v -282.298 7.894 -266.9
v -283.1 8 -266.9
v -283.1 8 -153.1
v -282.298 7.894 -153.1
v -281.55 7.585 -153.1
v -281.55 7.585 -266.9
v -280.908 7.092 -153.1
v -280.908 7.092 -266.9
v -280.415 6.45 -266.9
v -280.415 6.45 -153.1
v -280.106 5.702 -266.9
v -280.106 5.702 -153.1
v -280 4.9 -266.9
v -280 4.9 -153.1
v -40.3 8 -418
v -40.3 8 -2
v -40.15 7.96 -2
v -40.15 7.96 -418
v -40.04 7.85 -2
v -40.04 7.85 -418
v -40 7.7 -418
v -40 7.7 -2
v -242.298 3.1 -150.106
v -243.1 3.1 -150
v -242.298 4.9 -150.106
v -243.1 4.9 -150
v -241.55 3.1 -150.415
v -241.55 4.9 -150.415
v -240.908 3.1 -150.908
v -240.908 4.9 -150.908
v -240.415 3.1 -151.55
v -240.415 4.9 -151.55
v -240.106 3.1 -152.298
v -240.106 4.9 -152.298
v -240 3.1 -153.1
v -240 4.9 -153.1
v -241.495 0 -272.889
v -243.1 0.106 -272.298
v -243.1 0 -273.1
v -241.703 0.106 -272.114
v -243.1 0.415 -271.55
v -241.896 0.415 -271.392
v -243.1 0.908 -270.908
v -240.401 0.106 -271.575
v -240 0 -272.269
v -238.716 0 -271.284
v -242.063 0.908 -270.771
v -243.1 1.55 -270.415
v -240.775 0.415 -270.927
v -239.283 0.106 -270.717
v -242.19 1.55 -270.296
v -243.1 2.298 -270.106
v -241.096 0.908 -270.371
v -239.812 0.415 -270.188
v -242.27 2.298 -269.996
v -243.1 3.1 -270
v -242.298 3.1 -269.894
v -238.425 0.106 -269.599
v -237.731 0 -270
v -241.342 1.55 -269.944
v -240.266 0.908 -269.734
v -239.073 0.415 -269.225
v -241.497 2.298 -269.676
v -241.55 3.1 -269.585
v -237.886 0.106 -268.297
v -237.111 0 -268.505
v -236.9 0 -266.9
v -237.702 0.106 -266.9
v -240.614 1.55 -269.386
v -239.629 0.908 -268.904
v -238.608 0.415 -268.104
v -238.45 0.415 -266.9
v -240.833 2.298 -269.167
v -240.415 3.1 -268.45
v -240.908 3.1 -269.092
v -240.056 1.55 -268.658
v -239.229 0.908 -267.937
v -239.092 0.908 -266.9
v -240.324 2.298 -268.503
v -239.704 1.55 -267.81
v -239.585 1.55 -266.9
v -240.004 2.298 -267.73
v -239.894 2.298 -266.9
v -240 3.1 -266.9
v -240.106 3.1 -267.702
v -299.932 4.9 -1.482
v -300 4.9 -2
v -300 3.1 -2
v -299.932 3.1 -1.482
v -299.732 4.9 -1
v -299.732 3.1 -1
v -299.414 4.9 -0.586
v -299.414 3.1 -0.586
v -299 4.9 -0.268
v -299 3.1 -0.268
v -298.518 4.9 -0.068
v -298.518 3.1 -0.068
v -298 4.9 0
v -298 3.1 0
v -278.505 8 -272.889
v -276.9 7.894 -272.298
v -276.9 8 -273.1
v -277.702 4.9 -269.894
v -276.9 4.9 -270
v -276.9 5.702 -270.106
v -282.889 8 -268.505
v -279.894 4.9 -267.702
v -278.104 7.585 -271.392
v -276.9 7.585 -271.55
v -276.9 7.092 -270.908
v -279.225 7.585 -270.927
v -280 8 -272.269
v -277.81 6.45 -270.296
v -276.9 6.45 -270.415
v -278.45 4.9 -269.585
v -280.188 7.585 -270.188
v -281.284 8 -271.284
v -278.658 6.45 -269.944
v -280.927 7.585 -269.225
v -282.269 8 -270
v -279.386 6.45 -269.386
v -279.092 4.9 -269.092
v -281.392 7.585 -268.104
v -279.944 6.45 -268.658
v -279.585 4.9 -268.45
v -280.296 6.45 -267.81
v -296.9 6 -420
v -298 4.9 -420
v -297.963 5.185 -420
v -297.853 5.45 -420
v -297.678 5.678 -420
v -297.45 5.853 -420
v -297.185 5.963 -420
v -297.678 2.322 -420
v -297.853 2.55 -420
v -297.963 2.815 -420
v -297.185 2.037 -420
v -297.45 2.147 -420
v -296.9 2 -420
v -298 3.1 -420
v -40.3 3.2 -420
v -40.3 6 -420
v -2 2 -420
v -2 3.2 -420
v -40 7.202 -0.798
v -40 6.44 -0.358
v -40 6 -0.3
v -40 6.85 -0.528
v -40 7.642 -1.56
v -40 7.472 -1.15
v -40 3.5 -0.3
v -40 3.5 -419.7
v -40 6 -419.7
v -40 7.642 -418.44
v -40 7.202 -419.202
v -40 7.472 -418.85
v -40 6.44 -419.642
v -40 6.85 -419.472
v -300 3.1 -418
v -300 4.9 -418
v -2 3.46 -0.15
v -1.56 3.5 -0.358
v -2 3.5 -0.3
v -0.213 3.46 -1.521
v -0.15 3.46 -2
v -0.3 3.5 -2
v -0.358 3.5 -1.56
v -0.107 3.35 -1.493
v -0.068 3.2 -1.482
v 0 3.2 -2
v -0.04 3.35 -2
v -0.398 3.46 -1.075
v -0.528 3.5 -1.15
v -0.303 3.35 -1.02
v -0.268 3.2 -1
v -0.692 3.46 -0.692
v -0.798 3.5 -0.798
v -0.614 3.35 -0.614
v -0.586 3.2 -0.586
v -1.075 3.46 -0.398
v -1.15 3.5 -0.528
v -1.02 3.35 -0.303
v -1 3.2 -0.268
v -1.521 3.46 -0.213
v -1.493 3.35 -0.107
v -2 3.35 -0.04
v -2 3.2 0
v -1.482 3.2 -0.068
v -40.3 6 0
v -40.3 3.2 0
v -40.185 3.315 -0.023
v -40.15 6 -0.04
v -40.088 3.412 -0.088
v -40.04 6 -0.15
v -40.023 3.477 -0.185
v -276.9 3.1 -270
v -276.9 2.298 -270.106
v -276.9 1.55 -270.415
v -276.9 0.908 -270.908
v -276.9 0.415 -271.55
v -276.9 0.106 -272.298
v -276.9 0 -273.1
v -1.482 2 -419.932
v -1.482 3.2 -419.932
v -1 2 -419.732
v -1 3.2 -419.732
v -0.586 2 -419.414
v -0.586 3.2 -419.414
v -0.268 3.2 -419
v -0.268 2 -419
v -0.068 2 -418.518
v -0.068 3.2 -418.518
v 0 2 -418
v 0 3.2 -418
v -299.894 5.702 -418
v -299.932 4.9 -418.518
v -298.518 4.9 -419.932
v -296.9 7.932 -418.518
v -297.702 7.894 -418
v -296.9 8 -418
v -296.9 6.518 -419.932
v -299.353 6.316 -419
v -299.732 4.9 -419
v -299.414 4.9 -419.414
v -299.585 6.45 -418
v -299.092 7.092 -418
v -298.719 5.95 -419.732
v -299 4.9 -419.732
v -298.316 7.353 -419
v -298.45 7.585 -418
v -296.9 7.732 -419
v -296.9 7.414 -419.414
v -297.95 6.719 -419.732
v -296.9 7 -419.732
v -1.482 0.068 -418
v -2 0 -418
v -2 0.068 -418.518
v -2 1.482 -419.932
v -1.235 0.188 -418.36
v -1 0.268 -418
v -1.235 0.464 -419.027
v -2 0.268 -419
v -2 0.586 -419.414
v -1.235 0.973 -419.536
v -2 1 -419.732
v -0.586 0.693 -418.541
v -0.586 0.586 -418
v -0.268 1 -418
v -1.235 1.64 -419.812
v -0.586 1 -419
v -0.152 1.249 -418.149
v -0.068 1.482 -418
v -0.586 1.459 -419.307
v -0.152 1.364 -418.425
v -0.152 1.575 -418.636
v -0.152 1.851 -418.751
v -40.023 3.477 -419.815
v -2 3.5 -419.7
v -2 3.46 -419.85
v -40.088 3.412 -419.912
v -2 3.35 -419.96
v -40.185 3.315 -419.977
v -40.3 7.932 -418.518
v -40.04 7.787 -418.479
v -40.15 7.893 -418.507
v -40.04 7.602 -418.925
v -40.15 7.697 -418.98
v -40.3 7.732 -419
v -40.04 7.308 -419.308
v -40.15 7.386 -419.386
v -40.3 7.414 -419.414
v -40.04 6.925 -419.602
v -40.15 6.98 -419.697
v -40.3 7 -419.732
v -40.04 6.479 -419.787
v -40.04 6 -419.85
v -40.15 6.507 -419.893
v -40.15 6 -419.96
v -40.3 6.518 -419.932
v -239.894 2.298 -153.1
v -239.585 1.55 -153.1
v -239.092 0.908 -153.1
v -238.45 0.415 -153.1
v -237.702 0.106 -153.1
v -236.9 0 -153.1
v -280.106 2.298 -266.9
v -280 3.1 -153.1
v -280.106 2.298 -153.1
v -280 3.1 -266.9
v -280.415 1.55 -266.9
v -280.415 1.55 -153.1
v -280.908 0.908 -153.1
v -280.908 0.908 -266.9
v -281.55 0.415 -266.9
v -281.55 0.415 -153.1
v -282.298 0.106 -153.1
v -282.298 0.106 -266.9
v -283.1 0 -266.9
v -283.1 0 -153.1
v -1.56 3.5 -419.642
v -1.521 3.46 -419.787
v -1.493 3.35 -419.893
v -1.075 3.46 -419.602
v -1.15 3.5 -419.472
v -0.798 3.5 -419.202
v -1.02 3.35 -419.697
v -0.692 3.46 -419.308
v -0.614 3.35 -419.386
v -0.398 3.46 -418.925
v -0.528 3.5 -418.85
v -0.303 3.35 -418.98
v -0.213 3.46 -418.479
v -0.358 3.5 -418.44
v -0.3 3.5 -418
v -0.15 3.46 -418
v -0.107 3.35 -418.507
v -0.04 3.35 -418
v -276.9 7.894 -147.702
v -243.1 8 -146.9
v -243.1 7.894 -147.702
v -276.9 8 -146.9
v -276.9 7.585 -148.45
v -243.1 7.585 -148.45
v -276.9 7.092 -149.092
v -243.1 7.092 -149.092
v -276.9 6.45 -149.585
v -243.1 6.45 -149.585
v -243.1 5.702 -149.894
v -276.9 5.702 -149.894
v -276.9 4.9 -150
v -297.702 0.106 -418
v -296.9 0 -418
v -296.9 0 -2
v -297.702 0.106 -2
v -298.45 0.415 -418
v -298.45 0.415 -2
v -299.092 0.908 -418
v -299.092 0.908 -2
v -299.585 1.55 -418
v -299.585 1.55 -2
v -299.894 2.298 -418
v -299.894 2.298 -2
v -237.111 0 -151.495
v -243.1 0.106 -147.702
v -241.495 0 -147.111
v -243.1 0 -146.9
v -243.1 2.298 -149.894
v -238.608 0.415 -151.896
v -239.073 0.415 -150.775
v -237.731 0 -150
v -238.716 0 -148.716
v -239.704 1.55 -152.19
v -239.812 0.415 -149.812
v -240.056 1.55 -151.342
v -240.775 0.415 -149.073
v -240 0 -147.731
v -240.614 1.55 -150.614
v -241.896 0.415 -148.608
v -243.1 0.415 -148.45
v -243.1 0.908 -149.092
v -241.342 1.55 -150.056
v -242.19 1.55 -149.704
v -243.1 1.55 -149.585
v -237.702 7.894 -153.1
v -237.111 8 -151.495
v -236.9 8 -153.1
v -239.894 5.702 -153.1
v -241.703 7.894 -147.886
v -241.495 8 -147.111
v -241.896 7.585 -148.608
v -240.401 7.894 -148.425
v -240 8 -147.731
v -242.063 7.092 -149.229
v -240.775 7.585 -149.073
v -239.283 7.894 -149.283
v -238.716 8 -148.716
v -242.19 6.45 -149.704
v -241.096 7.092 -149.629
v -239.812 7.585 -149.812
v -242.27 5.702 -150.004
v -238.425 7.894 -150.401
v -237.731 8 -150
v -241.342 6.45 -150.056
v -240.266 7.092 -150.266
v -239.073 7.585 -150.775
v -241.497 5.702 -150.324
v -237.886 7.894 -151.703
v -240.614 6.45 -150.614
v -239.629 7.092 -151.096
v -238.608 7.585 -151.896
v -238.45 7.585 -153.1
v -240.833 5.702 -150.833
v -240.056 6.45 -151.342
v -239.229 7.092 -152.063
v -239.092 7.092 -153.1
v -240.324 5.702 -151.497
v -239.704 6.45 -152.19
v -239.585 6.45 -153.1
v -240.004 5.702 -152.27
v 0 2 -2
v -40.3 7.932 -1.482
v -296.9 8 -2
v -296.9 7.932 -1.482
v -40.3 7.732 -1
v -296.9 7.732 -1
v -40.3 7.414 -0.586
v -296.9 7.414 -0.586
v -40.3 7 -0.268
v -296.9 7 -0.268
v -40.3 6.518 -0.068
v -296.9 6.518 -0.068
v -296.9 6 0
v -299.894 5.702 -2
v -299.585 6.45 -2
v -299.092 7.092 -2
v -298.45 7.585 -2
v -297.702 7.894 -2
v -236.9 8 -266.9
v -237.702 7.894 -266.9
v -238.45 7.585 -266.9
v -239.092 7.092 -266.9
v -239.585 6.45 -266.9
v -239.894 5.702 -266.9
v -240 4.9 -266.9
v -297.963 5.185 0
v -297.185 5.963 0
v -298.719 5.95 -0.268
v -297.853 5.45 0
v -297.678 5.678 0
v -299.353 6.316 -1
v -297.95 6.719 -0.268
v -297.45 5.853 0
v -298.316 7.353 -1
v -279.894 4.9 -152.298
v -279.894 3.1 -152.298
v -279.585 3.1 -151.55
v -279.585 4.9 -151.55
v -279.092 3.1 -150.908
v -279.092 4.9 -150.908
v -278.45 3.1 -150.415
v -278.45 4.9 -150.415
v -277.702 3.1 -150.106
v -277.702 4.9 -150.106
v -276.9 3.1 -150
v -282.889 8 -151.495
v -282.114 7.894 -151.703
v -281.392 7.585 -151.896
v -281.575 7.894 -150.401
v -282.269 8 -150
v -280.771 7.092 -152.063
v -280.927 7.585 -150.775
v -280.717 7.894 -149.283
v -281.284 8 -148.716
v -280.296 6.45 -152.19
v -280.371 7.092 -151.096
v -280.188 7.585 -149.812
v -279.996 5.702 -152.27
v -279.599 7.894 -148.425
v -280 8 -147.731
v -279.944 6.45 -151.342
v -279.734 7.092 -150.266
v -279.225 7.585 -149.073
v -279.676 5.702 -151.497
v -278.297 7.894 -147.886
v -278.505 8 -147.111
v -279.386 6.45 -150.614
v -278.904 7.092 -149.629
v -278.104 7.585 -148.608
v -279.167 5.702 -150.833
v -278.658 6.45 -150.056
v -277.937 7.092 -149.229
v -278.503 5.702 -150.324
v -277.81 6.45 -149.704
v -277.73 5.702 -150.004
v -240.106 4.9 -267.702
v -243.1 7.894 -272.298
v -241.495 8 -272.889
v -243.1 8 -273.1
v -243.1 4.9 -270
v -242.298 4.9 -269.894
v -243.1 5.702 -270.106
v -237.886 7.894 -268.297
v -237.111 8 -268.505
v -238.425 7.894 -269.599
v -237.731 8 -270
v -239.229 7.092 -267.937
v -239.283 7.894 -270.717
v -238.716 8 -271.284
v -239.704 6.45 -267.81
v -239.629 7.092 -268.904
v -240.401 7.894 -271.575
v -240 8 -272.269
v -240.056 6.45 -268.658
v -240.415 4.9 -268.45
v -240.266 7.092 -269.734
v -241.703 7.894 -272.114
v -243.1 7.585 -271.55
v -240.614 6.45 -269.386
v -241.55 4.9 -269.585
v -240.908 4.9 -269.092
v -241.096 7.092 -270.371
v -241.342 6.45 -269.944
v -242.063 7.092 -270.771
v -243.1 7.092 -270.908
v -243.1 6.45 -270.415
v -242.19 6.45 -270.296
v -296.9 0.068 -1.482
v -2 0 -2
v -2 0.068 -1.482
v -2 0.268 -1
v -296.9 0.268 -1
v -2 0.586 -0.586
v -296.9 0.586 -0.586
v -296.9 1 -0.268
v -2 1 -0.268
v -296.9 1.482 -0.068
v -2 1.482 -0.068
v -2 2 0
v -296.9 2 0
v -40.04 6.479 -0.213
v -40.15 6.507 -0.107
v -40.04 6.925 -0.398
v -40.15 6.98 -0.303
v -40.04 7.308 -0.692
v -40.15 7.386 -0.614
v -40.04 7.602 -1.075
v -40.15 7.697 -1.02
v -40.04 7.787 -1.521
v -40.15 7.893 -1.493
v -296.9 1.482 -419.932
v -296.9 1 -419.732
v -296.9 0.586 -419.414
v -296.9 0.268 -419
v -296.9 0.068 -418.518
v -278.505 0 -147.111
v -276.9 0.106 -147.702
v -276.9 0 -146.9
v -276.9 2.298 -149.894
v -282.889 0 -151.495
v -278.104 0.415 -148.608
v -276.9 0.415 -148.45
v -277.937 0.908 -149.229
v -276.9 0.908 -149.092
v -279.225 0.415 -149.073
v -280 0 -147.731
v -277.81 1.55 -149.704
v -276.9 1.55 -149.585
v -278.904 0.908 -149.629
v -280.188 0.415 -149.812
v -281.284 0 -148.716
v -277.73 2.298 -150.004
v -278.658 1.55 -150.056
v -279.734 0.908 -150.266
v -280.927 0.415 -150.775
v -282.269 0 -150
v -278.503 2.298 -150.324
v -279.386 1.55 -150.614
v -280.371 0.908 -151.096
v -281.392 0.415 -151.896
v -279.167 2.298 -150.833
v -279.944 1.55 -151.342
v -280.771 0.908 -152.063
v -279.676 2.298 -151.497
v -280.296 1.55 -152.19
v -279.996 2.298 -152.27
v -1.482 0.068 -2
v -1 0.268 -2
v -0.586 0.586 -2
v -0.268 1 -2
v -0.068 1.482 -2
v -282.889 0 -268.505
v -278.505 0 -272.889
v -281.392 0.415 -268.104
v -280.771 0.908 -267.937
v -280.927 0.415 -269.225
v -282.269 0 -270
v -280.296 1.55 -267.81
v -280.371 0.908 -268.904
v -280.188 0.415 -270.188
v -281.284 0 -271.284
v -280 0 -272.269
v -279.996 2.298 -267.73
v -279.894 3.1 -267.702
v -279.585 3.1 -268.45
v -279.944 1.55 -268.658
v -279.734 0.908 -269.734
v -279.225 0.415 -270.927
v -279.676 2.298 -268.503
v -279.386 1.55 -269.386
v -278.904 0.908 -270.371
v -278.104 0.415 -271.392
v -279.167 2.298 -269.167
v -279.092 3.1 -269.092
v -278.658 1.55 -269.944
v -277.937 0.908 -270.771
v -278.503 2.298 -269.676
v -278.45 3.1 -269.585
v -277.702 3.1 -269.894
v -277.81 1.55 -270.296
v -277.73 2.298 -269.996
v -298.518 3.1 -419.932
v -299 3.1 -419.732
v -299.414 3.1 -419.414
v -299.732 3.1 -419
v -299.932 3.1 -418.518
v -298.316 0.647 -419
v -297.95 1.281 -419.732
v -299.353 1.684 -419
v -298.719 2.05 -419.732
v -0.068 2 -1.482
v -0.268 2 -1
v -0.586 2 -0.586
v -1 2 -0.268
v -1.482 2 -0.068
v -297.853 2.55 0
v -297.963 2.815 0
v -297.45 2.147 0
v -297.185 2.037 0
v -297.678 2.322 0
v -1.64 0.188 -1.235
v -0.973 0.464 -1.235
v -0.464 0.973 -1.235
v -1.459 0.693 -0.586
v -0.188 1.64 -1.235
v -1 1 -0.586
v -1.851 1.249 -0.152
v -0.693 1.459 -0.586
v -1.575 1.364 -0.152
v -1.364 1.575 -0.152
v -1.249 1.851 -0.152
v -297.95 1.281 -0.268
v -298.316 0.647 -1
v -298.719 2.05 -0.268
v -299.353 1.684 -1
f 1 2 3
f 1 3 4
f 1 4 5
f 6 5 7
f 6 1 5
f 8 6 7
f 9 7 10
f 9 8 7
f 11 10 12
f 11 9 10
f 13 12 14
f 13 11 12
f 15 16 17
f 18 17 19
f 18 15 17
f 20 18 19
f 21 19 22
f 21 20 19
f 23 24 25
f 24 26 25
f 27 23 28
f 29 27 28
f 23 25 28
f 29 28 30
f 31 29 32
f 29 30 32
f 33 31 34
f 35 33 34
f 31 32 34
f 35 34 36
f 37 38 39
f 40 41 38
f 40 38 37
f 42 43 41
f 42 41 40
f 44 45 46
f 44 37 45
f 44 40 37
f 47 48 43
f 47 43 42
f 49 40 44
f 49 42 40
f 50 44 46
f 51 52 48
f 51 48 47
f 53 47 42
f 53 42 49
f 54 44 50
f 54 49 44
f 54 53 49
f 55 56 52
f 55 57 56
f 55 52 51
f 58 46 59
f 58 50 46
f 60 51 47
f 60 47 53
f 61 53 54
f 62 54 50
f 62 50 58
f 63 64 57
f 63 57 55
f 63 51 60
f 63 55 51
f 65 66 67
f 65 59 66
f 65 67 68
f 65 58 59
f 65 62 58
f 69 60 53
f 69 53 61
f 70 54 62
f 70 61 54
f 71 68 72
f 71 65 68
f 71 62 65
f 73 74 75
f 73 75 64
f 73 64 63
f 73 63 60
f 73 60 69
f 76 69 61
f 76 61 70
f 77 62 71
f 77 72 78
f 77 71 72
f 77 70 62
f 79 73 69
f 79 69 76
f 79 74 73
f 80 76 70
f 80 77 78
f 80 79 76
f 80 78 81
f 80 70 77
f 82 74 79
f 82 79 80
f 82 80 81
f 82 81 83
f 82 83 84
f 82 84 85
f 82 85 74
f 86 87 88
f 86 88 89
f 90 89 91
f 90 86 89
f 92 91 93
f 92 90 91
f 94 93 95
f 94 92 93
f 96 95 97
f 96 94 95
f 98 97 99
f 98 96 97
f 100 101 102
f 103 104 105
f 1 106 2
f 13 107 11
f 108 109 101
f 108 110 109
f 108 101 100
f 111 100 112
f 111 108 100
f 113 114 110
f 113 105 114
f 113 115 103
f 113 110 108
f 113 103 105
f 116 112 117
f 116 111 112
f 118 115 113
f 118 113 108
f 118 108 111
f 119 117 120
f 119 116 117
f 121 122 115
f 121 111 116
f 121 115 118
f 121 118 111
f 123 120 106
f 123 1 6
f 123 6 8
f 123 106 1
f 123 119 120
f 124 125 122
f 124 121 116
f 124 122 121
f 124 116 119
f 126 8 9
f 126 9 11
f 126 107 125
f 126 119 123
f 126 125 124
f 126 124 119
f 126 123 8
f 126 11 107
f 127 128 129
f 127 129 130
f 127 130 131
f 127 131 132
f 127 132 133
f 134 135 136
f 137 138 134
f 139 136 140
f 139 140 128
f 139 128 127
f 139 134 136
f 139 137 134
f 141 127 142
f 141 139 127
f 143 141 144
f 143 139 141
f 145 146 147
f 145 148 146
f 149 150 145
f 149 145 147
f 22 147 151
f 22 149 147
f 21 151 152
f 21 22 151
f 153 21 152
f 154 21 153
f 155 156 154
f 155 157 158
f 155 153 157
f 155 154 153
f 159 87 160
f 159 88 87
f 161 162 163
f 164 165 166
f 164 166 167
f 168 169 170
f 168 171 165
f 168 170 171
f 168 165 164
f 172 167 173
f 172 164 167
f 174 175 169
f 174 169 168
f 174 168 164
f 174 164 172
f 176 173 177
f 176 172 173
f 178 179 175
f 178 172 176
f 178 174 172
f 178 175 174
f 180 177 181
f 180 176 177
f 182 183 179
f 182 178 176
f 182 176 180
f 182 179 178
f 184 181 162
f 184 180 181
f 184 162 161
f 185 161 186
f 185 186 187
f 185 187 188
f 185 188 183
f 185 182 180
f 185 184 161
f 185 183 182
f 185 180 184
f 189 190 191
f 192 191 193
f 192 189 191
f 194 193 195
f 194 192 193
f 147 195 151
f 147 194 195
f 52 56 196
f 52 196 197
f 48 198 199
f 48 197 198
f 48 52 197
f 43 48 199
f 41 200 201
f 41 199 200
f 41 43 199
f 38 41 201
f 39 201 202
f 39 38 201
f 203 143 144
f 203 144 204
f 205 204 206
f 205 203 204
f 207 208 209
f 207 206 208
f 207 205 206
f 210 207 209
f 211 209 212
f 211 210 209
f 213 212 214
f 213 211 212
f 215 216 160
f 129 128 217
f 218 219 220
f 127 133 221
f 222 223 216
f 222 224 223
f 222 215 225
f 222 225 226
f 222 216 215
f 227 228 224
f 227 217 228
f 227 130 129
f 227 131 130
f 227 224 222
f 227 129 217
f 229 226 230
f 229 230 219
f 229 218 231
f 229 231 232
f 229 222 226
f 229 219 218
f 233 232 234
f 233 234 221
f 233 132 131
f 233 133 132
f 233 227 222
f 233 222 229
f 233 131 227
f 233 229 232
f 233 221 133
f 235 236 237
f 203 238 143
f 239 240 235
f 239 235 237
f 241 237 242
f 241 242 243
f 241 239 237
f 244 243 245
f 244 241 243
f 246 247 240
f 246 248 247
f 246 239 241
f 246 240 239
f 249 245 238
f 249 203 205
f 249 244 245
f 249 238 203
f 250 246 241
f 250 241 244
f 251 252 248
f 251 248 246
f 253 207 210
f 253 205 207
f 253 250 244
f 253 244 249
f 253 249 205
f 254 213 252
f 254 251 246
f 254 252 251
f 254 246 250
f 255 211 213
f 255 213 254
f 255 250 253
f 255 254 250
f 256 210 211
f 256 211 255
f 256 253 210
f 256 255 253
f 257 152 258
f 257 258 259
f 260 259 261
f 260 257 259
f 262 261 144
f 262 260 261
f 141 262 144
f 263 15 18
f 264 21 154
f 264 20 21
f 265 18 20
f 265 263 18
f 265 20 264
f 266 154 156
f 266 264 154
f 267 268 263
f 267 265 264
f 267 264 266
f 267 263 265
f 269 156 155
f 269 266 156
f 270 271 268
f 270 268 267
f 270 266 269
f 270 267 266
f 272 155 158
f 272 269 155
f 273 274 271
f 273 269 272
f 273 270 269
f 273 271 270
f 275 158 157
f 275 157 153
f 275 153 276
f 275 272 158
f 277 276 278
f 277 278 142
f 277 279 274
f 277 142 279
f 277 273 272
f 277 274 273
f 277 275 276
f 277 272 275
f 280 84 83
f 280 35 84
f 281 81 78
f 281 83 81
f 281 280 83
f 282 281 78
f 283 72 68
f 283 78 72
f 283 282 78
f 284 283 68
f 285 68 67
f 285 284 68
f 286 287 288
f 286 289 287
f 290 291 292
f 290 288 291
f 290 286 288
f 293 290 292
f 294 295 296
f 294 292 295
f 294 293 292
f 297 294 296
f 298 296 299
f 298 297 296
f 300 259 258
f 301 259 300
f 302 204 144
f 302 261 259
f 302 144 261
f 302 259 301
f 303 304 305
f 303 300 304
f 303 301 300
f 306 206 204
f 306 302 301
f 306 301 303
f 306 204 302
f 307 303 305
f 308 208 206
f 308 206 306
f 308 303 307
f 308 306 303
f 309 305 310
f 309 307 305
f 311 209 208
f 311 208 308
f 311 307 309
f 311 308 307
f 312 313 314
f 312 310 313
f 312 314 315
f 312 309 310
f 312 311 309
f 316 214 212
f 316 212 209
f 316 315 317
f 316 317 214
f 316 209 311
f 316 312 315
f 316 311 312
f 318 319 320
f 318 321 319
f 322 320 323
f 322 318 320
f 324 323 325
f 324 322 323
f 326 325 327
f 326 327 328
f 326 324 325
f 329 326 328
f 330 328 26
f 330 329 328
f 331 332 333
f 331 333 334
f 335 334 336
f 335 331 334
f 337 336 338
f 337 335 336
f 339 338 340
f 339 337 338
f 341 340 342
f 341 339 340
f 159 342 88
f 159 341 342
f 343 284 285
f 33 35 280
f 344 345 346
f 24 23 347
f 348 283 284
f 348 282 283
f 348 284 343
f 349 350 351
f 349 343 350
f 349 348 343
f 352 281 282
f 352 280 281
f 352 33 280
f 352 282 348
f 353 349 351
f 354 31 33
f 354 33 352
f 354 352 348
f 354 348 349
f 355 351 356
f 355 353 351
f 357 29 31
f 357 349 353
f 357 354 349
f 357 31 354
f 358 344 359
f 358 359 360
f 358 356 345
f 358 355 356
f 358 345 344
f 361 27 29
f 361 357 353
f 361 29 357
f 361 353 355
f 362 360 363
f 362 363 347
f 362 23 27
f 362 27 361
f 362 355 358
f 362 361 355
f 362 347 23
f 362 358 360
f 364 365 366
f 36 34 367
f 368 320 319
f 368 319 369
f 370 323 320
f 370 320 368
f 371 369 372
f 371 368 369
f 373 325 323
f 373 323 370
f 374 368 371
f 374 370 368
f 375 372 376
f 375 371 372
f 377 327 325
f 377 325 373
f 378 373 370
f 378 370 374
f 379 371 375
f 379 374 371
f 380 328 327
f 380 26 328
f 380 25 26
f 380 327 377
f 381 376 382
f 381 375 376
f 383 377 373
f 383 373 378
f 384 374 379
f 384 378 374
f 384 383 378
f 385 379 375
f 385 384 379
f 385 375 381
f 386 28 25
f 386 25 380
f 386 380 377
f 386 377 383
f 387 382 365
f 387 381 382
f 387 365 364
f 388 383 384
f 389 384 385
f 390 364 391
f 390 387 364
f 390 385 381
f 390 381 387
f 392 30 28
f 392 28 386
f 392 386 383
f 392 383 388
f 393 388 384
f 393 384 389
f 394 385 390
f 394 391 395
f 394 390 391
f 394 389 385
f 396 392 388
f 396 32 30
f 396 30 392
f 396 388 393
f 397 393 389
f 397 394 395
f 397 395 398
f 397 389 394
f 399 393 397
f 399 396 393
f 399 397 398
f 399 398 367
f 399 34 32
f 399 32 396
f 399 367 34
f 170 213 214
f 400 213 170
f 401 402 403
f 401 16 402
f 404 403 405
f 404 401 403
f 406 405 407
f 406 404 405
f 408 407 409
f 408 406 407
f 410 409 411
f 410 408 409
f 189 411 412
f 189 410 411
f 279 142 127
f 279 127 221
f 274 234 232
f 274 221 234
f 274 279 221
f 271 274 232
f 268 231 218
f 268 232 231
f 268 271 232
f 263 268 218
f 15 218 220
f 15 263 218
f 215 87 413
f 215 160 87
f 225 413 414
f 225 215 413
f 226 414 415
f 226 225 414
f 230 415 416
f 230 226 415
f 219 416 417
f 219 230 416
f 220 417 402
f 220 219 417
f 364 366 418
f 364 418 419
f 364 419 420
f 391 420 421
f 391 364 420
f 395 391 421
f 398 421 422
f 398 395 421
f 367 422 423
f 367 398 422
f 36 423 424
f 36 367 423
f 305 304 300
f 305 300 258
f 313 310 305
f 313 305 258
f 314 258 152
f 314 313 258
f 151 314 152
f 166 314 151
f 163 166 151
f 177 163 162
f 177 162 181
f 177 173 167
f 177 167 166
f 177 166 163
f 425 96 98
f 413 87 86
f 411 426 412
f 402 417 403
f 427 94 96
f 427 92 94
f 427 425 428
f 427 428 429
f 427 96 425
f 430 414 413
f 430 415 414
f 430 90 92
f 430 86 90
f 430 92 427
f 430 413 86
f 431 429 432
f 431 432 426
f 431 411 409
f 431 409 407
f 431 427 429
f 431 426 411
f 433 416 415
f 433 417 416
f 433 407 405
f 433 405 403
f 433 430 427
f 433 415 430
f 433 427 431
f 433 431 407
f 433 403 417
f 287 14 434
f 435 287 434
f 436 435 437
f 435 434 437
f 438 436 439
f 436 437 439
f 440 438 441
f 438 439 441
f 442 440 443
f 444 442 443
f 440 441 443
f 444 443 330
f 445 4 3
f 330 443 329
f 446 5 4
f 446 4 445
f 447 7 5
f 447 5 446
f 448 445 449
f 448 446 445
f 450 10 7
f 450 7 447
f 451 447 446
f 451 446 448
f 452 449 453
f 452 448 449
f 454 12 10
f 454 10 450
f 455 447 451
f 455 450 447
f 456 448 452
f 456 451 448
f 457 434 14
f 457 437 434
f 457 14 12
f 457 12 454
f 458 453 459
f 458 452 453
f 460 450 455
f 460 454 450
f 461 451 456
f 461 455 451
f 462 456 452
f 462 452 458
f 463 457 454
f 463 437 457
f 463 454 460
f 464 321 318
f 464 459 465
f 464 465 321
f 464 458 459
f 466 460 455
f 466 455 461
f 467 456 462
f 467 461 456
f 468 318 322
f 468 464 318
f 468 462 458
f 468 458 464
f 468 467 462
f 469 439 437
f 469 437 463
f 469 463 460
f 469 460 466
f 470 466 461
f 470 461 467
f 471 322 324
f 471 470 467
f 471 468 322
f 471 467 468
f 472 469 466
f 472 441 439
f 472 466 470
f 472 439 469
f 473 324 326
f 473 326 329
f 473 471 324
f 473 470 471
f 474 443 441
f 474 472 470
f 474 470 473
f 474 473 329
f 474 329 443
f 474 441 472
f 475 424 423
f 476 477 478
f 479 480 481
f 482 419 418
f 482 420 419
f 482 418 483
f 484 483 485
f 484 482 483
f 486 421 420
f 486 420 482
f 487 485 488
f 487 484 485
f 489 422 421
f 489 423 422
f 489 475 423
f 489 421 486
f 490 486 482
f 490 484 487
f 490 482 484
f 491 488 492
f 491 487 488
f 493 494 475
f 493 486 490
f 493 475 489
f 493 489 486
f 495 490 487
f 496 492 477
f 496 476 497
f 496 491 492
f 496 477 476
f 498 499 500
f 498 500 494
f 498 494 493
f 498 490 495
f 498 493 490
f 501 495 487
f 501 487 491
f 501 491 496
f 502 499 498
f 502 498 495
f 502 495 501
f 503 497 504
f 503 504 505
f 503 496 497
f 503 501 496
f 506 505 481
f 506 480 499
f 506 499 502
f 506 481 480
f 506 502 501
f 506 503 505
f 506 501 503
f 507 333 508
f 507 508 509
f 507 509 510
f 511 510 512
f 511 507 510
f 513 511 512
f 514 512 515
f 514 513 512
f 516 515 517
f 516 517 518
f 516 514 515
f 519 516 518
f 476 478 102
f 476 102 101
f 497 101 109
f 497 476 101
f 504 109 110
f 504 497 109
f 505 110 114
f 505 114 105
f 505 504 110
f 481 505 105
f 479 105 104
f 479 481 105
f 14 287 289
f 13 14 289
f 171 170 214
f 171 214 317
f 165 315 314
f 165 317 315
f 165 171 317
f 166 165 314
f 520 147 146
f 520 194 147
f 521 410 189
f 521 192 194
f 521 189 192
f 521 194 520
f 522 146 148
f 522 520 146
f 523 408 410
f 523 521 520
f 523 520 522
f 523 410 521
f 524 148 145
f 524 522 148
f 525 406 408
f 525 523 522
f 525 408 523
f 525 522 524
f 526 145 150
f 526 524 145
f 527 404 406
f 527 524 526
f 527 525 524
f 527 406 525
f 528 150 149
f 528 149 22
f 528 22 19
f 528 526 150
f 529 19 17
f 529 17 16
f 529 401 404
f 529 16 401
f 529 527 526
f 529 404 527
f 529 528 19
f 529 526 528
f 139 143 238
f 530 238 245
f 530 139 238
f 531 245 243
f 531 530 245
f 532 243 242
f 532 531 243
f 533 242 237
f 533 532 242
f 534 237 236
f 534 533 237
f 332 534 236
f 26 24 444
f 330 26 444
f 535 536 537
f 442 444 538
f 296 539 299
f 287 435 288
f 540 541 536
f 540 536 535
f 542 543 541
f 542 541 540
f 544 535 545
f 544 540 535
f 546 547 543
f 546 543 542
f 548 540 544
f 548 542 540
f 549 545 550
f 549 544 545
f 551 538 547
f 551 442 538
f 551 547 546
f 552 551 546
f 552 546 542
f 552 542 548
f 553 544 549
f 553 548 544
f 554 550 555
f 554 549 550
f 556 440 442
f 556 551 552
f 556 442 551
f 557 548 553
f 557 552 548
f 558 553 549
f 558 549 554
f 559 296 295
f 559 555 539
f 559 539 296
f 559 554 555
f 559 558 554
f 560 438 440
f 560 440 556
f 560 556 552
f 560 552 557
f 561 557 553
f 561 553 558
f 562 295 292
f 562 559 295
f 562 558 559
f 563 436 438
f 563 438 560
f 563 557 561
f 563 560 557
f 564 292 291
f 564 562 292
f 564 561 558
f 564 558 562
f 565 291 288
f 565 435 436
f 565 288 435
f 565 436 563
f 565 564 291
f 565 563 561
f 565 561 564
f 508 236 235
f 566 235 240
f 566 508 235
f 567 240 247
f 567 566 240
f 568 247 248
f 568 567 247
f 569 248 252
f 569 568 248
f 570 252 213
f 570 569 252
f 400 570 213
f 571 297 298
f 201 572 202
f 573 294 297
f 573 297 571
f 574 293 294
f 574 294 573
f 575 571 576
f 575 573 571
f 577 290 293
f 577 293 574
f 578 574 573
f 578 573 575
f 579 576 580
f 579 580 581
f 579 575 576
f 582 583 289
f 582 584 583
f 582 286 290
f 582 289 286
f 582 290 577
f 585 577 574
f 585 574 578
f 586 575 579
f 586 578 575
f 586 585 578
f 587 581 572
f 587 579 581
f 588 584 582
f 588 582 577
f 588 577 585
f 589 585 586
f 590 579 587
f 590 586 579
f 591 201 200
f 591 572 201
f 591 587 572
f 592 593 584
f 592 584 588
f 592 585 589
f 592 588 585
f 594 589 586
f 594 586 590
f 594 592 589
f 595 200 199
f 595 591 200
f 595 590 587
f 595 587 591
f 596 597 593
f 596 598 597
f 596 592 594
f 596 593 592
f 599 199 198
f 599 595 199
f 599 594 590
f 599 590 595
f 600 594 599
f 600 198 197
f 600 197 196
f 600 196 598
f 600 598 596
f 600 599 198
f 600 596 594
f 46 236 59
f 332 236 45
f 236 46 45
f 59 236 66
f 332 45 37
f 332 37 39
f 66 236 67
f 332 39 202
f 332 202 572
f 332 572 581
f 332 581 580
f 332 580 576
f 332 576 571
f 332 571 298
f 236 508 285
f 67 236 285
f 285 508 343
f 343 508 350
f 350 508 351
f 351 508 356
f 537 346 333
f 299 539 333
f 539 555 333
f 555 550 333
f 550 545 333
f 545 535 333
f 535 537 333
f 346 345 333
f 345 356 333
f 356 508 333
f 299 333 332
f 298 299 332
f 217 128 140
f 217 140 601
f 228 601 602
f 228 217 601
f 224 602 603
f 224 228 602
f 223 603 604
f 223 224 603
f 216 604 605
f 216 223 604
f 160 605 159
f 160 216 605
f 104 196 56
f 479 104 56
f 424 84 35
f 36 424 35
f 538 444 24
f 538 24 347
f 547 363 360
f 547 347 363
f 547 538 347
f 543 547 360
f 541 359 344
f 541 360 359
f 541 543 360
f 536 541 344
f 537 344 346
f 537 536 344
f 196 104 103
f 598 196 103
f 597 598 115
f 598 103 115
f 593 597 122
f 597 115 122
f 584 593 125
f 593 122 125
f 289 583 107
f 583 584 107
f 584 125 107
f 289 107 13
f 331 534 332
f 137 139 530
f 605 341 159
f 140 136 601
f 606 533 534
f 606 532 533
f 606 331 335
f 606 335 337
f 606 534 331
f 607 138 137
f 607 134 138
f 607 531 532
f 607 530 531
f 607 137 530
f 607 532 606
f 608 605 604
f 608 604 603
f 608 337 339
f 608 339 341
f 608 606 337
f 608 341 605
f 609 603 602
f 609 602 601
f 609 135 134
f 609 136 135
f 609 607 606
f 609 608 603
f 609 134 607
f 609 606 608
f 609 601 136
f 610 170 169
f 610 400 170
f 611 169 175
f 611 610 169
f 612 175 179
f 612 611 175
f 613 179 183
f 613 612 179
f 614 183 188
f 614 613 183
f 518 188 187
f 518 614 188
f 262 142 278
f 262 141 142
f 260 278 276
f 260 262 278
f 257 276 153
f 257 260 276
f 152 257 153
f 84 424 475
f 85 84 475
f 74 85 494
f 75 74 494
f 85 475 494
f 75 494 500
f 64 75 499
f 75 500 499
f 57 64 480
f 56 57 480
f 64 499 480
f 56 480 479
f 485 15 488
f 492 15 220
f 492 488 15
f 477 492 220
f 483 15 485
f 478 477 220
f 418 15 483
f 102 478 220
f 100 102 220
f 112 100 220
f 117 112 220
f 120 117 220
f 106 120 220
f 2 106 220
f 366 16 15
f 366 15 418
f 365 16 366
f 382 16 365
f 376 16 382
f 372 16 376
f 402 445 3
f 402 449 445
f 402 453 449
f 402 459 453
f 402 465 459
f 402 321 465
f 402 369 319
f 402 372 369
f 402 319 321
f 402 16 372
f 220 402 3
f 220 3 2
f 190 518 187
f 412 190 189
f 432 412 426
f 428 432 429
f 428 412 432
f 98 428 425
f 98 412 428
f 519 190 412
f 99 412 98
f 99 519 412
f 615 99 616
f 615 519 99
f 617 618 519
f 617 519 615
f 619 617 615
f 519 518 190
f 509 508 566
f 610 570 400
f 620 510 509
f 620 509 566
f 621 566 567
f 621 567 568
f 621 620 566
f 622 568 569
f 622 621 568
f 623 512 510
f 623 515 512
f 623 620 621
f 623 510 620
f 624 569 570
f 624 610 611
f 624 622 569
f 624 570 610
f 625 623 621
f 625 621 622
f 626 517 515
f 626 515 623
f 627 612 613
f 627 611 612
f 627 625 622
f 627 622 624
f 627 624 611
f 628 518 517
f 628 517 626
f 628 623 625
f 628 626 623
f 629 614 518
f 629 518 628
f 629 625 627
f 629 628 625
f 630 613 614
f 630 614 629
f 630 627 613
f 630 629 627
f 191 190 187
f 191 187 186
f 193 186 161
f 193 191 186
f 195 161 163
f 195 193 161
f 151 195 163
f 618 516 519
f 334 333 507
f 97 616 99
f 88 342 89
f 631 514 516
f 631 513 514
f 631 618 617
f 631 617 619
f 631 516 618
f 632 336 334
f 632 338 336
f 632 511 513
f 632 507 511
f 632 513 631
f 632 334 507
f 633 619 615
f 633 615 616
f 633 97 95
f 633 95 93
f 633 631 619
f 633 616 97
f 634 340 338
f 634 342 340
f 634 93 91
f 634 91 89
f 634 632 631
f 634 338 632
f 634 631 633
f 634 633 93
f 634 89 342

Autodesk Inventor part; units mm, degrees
ref_plane "YZ Plane" through (0, 0, 0) normal (1, 0, 0) x (0, 1, 0)
ref_plane "XZ Plane" through (0, 0, 0) normal (0, 1, 0) x (-1, 0, 0)
ref_plane "XY Plane" through (0, 0, 0) normal (0, 0, 1) x (1, 0, 0)
sketch "Sketch1" plane through (0, 0, 0) normal (0, 1, 0) x (-1, 0, 0)
  line L0 (0, 0) -> (300, 0)
  line L1 (300, 0) -> (300, -420)
  line L2 (300, -420) -> (0, -420)
  line L3 (0, -420) -> (0, 0)
  line L4 (240, -150) -> (280, -150)
  line L5 (280, -150) -> (280, -270)
  line L6 (280, -270) -> (240, -270)
  line L7 (240, -270) -> (240, -150)
  line L8 (240, -150) -> (280, -270) construction
  line L9 (280, -150) -> (240, -270) construction
  dimension "d0" = 300
  dimension "d1" = 420
  dimension "d5" = 40
  dimension "d6" = 120
extrude "Extrusion1" add sketch "Sketch1" along normal blind 8
sketch "Sketch2" plane through (0, 0, 0) normal (1, 0, 0) x (0, 0, -1)
  line L0 (150, 0) -> (270, 0) projected
  line L1 (210, 0) -> (210, 4)
  line L2 (420, 0) -> (420, 8) projected
  line L3 (0, 4.5) -> (420, 4.5)
  line L4 (420, 4.5) -> (420, 3.5)
  line L5 (420, 3.5) -> (0, 3.5)
  line L6 (0, 3.5) -> (0, 4.5)
  line L7 (0, 4.5) -> (420, 3.5) construction
  line L8 (420, 4.5) -> (0, 3.5) construction
  line L9 (0, 0) -> (0, 8) projected
  line L10 (420, 3.5) -> (0, 3.5)
  line L11 (0, 3.5) -> (0, 8)
  line L12 (0, 8) -> (420, 8)
  line L13 (420, 8) -> (420, 3.5)
  dimension "d7" = 4
  dimension "d8" = 1
extrude "Extrusion2" cut sketch "Sketch2" against normal blind 40
fillet "Fillet1" radius 3.1 14 edges at (-300, 8, -210) (-300, 0, -210) (-280, 8, -210) (-260, 8, -270) (-240, 8, -210) (-280, 0, -210) (-260, 0, -270) (-280, 4, -270) (-240, 4, -270) (-240, 4, -150) (-260, 0, -150) (-260, 8, -150) (-280, 4, -150) (-240, 0, -210)
fillet "Fillet2" radius 2 11 edges at (-299.092, 7.092, 0) (-300, 4, 0) (-299.092, 0.908, 0) (-148.45, 0, 0) (-168.45, 8, 0) (-299.092, 7.092, -420) (-300, 4, -420) (-299.092, 0.908, -420) (-148.45, 0, -420) (-168.45, 8, -420) (0, 0, -210)
fillet "Fillet3" radius 0.3 8 edges at (-40, 7.4142, -419.4142) (-40, 4.75, -420) (-40, 7.4142, -0.5858) (-40, 4.75, 0) (-40, 8, -210) (-20, 3.5, -420) (0, 3.5, -210) (-20, 3.5, 0)
fillet "Fillet4" radius 2 6 edges at (-0.0879, 3.4121, -0.0879) (-0.5858, 0.5858, -0.5858) (0, 2.6, 0) (-0.0879, 3.4121, -419.9121) (-0.5858, 0.5858, -419.4142) (0, 2.6, -420)
properties part number "RightFlap"
